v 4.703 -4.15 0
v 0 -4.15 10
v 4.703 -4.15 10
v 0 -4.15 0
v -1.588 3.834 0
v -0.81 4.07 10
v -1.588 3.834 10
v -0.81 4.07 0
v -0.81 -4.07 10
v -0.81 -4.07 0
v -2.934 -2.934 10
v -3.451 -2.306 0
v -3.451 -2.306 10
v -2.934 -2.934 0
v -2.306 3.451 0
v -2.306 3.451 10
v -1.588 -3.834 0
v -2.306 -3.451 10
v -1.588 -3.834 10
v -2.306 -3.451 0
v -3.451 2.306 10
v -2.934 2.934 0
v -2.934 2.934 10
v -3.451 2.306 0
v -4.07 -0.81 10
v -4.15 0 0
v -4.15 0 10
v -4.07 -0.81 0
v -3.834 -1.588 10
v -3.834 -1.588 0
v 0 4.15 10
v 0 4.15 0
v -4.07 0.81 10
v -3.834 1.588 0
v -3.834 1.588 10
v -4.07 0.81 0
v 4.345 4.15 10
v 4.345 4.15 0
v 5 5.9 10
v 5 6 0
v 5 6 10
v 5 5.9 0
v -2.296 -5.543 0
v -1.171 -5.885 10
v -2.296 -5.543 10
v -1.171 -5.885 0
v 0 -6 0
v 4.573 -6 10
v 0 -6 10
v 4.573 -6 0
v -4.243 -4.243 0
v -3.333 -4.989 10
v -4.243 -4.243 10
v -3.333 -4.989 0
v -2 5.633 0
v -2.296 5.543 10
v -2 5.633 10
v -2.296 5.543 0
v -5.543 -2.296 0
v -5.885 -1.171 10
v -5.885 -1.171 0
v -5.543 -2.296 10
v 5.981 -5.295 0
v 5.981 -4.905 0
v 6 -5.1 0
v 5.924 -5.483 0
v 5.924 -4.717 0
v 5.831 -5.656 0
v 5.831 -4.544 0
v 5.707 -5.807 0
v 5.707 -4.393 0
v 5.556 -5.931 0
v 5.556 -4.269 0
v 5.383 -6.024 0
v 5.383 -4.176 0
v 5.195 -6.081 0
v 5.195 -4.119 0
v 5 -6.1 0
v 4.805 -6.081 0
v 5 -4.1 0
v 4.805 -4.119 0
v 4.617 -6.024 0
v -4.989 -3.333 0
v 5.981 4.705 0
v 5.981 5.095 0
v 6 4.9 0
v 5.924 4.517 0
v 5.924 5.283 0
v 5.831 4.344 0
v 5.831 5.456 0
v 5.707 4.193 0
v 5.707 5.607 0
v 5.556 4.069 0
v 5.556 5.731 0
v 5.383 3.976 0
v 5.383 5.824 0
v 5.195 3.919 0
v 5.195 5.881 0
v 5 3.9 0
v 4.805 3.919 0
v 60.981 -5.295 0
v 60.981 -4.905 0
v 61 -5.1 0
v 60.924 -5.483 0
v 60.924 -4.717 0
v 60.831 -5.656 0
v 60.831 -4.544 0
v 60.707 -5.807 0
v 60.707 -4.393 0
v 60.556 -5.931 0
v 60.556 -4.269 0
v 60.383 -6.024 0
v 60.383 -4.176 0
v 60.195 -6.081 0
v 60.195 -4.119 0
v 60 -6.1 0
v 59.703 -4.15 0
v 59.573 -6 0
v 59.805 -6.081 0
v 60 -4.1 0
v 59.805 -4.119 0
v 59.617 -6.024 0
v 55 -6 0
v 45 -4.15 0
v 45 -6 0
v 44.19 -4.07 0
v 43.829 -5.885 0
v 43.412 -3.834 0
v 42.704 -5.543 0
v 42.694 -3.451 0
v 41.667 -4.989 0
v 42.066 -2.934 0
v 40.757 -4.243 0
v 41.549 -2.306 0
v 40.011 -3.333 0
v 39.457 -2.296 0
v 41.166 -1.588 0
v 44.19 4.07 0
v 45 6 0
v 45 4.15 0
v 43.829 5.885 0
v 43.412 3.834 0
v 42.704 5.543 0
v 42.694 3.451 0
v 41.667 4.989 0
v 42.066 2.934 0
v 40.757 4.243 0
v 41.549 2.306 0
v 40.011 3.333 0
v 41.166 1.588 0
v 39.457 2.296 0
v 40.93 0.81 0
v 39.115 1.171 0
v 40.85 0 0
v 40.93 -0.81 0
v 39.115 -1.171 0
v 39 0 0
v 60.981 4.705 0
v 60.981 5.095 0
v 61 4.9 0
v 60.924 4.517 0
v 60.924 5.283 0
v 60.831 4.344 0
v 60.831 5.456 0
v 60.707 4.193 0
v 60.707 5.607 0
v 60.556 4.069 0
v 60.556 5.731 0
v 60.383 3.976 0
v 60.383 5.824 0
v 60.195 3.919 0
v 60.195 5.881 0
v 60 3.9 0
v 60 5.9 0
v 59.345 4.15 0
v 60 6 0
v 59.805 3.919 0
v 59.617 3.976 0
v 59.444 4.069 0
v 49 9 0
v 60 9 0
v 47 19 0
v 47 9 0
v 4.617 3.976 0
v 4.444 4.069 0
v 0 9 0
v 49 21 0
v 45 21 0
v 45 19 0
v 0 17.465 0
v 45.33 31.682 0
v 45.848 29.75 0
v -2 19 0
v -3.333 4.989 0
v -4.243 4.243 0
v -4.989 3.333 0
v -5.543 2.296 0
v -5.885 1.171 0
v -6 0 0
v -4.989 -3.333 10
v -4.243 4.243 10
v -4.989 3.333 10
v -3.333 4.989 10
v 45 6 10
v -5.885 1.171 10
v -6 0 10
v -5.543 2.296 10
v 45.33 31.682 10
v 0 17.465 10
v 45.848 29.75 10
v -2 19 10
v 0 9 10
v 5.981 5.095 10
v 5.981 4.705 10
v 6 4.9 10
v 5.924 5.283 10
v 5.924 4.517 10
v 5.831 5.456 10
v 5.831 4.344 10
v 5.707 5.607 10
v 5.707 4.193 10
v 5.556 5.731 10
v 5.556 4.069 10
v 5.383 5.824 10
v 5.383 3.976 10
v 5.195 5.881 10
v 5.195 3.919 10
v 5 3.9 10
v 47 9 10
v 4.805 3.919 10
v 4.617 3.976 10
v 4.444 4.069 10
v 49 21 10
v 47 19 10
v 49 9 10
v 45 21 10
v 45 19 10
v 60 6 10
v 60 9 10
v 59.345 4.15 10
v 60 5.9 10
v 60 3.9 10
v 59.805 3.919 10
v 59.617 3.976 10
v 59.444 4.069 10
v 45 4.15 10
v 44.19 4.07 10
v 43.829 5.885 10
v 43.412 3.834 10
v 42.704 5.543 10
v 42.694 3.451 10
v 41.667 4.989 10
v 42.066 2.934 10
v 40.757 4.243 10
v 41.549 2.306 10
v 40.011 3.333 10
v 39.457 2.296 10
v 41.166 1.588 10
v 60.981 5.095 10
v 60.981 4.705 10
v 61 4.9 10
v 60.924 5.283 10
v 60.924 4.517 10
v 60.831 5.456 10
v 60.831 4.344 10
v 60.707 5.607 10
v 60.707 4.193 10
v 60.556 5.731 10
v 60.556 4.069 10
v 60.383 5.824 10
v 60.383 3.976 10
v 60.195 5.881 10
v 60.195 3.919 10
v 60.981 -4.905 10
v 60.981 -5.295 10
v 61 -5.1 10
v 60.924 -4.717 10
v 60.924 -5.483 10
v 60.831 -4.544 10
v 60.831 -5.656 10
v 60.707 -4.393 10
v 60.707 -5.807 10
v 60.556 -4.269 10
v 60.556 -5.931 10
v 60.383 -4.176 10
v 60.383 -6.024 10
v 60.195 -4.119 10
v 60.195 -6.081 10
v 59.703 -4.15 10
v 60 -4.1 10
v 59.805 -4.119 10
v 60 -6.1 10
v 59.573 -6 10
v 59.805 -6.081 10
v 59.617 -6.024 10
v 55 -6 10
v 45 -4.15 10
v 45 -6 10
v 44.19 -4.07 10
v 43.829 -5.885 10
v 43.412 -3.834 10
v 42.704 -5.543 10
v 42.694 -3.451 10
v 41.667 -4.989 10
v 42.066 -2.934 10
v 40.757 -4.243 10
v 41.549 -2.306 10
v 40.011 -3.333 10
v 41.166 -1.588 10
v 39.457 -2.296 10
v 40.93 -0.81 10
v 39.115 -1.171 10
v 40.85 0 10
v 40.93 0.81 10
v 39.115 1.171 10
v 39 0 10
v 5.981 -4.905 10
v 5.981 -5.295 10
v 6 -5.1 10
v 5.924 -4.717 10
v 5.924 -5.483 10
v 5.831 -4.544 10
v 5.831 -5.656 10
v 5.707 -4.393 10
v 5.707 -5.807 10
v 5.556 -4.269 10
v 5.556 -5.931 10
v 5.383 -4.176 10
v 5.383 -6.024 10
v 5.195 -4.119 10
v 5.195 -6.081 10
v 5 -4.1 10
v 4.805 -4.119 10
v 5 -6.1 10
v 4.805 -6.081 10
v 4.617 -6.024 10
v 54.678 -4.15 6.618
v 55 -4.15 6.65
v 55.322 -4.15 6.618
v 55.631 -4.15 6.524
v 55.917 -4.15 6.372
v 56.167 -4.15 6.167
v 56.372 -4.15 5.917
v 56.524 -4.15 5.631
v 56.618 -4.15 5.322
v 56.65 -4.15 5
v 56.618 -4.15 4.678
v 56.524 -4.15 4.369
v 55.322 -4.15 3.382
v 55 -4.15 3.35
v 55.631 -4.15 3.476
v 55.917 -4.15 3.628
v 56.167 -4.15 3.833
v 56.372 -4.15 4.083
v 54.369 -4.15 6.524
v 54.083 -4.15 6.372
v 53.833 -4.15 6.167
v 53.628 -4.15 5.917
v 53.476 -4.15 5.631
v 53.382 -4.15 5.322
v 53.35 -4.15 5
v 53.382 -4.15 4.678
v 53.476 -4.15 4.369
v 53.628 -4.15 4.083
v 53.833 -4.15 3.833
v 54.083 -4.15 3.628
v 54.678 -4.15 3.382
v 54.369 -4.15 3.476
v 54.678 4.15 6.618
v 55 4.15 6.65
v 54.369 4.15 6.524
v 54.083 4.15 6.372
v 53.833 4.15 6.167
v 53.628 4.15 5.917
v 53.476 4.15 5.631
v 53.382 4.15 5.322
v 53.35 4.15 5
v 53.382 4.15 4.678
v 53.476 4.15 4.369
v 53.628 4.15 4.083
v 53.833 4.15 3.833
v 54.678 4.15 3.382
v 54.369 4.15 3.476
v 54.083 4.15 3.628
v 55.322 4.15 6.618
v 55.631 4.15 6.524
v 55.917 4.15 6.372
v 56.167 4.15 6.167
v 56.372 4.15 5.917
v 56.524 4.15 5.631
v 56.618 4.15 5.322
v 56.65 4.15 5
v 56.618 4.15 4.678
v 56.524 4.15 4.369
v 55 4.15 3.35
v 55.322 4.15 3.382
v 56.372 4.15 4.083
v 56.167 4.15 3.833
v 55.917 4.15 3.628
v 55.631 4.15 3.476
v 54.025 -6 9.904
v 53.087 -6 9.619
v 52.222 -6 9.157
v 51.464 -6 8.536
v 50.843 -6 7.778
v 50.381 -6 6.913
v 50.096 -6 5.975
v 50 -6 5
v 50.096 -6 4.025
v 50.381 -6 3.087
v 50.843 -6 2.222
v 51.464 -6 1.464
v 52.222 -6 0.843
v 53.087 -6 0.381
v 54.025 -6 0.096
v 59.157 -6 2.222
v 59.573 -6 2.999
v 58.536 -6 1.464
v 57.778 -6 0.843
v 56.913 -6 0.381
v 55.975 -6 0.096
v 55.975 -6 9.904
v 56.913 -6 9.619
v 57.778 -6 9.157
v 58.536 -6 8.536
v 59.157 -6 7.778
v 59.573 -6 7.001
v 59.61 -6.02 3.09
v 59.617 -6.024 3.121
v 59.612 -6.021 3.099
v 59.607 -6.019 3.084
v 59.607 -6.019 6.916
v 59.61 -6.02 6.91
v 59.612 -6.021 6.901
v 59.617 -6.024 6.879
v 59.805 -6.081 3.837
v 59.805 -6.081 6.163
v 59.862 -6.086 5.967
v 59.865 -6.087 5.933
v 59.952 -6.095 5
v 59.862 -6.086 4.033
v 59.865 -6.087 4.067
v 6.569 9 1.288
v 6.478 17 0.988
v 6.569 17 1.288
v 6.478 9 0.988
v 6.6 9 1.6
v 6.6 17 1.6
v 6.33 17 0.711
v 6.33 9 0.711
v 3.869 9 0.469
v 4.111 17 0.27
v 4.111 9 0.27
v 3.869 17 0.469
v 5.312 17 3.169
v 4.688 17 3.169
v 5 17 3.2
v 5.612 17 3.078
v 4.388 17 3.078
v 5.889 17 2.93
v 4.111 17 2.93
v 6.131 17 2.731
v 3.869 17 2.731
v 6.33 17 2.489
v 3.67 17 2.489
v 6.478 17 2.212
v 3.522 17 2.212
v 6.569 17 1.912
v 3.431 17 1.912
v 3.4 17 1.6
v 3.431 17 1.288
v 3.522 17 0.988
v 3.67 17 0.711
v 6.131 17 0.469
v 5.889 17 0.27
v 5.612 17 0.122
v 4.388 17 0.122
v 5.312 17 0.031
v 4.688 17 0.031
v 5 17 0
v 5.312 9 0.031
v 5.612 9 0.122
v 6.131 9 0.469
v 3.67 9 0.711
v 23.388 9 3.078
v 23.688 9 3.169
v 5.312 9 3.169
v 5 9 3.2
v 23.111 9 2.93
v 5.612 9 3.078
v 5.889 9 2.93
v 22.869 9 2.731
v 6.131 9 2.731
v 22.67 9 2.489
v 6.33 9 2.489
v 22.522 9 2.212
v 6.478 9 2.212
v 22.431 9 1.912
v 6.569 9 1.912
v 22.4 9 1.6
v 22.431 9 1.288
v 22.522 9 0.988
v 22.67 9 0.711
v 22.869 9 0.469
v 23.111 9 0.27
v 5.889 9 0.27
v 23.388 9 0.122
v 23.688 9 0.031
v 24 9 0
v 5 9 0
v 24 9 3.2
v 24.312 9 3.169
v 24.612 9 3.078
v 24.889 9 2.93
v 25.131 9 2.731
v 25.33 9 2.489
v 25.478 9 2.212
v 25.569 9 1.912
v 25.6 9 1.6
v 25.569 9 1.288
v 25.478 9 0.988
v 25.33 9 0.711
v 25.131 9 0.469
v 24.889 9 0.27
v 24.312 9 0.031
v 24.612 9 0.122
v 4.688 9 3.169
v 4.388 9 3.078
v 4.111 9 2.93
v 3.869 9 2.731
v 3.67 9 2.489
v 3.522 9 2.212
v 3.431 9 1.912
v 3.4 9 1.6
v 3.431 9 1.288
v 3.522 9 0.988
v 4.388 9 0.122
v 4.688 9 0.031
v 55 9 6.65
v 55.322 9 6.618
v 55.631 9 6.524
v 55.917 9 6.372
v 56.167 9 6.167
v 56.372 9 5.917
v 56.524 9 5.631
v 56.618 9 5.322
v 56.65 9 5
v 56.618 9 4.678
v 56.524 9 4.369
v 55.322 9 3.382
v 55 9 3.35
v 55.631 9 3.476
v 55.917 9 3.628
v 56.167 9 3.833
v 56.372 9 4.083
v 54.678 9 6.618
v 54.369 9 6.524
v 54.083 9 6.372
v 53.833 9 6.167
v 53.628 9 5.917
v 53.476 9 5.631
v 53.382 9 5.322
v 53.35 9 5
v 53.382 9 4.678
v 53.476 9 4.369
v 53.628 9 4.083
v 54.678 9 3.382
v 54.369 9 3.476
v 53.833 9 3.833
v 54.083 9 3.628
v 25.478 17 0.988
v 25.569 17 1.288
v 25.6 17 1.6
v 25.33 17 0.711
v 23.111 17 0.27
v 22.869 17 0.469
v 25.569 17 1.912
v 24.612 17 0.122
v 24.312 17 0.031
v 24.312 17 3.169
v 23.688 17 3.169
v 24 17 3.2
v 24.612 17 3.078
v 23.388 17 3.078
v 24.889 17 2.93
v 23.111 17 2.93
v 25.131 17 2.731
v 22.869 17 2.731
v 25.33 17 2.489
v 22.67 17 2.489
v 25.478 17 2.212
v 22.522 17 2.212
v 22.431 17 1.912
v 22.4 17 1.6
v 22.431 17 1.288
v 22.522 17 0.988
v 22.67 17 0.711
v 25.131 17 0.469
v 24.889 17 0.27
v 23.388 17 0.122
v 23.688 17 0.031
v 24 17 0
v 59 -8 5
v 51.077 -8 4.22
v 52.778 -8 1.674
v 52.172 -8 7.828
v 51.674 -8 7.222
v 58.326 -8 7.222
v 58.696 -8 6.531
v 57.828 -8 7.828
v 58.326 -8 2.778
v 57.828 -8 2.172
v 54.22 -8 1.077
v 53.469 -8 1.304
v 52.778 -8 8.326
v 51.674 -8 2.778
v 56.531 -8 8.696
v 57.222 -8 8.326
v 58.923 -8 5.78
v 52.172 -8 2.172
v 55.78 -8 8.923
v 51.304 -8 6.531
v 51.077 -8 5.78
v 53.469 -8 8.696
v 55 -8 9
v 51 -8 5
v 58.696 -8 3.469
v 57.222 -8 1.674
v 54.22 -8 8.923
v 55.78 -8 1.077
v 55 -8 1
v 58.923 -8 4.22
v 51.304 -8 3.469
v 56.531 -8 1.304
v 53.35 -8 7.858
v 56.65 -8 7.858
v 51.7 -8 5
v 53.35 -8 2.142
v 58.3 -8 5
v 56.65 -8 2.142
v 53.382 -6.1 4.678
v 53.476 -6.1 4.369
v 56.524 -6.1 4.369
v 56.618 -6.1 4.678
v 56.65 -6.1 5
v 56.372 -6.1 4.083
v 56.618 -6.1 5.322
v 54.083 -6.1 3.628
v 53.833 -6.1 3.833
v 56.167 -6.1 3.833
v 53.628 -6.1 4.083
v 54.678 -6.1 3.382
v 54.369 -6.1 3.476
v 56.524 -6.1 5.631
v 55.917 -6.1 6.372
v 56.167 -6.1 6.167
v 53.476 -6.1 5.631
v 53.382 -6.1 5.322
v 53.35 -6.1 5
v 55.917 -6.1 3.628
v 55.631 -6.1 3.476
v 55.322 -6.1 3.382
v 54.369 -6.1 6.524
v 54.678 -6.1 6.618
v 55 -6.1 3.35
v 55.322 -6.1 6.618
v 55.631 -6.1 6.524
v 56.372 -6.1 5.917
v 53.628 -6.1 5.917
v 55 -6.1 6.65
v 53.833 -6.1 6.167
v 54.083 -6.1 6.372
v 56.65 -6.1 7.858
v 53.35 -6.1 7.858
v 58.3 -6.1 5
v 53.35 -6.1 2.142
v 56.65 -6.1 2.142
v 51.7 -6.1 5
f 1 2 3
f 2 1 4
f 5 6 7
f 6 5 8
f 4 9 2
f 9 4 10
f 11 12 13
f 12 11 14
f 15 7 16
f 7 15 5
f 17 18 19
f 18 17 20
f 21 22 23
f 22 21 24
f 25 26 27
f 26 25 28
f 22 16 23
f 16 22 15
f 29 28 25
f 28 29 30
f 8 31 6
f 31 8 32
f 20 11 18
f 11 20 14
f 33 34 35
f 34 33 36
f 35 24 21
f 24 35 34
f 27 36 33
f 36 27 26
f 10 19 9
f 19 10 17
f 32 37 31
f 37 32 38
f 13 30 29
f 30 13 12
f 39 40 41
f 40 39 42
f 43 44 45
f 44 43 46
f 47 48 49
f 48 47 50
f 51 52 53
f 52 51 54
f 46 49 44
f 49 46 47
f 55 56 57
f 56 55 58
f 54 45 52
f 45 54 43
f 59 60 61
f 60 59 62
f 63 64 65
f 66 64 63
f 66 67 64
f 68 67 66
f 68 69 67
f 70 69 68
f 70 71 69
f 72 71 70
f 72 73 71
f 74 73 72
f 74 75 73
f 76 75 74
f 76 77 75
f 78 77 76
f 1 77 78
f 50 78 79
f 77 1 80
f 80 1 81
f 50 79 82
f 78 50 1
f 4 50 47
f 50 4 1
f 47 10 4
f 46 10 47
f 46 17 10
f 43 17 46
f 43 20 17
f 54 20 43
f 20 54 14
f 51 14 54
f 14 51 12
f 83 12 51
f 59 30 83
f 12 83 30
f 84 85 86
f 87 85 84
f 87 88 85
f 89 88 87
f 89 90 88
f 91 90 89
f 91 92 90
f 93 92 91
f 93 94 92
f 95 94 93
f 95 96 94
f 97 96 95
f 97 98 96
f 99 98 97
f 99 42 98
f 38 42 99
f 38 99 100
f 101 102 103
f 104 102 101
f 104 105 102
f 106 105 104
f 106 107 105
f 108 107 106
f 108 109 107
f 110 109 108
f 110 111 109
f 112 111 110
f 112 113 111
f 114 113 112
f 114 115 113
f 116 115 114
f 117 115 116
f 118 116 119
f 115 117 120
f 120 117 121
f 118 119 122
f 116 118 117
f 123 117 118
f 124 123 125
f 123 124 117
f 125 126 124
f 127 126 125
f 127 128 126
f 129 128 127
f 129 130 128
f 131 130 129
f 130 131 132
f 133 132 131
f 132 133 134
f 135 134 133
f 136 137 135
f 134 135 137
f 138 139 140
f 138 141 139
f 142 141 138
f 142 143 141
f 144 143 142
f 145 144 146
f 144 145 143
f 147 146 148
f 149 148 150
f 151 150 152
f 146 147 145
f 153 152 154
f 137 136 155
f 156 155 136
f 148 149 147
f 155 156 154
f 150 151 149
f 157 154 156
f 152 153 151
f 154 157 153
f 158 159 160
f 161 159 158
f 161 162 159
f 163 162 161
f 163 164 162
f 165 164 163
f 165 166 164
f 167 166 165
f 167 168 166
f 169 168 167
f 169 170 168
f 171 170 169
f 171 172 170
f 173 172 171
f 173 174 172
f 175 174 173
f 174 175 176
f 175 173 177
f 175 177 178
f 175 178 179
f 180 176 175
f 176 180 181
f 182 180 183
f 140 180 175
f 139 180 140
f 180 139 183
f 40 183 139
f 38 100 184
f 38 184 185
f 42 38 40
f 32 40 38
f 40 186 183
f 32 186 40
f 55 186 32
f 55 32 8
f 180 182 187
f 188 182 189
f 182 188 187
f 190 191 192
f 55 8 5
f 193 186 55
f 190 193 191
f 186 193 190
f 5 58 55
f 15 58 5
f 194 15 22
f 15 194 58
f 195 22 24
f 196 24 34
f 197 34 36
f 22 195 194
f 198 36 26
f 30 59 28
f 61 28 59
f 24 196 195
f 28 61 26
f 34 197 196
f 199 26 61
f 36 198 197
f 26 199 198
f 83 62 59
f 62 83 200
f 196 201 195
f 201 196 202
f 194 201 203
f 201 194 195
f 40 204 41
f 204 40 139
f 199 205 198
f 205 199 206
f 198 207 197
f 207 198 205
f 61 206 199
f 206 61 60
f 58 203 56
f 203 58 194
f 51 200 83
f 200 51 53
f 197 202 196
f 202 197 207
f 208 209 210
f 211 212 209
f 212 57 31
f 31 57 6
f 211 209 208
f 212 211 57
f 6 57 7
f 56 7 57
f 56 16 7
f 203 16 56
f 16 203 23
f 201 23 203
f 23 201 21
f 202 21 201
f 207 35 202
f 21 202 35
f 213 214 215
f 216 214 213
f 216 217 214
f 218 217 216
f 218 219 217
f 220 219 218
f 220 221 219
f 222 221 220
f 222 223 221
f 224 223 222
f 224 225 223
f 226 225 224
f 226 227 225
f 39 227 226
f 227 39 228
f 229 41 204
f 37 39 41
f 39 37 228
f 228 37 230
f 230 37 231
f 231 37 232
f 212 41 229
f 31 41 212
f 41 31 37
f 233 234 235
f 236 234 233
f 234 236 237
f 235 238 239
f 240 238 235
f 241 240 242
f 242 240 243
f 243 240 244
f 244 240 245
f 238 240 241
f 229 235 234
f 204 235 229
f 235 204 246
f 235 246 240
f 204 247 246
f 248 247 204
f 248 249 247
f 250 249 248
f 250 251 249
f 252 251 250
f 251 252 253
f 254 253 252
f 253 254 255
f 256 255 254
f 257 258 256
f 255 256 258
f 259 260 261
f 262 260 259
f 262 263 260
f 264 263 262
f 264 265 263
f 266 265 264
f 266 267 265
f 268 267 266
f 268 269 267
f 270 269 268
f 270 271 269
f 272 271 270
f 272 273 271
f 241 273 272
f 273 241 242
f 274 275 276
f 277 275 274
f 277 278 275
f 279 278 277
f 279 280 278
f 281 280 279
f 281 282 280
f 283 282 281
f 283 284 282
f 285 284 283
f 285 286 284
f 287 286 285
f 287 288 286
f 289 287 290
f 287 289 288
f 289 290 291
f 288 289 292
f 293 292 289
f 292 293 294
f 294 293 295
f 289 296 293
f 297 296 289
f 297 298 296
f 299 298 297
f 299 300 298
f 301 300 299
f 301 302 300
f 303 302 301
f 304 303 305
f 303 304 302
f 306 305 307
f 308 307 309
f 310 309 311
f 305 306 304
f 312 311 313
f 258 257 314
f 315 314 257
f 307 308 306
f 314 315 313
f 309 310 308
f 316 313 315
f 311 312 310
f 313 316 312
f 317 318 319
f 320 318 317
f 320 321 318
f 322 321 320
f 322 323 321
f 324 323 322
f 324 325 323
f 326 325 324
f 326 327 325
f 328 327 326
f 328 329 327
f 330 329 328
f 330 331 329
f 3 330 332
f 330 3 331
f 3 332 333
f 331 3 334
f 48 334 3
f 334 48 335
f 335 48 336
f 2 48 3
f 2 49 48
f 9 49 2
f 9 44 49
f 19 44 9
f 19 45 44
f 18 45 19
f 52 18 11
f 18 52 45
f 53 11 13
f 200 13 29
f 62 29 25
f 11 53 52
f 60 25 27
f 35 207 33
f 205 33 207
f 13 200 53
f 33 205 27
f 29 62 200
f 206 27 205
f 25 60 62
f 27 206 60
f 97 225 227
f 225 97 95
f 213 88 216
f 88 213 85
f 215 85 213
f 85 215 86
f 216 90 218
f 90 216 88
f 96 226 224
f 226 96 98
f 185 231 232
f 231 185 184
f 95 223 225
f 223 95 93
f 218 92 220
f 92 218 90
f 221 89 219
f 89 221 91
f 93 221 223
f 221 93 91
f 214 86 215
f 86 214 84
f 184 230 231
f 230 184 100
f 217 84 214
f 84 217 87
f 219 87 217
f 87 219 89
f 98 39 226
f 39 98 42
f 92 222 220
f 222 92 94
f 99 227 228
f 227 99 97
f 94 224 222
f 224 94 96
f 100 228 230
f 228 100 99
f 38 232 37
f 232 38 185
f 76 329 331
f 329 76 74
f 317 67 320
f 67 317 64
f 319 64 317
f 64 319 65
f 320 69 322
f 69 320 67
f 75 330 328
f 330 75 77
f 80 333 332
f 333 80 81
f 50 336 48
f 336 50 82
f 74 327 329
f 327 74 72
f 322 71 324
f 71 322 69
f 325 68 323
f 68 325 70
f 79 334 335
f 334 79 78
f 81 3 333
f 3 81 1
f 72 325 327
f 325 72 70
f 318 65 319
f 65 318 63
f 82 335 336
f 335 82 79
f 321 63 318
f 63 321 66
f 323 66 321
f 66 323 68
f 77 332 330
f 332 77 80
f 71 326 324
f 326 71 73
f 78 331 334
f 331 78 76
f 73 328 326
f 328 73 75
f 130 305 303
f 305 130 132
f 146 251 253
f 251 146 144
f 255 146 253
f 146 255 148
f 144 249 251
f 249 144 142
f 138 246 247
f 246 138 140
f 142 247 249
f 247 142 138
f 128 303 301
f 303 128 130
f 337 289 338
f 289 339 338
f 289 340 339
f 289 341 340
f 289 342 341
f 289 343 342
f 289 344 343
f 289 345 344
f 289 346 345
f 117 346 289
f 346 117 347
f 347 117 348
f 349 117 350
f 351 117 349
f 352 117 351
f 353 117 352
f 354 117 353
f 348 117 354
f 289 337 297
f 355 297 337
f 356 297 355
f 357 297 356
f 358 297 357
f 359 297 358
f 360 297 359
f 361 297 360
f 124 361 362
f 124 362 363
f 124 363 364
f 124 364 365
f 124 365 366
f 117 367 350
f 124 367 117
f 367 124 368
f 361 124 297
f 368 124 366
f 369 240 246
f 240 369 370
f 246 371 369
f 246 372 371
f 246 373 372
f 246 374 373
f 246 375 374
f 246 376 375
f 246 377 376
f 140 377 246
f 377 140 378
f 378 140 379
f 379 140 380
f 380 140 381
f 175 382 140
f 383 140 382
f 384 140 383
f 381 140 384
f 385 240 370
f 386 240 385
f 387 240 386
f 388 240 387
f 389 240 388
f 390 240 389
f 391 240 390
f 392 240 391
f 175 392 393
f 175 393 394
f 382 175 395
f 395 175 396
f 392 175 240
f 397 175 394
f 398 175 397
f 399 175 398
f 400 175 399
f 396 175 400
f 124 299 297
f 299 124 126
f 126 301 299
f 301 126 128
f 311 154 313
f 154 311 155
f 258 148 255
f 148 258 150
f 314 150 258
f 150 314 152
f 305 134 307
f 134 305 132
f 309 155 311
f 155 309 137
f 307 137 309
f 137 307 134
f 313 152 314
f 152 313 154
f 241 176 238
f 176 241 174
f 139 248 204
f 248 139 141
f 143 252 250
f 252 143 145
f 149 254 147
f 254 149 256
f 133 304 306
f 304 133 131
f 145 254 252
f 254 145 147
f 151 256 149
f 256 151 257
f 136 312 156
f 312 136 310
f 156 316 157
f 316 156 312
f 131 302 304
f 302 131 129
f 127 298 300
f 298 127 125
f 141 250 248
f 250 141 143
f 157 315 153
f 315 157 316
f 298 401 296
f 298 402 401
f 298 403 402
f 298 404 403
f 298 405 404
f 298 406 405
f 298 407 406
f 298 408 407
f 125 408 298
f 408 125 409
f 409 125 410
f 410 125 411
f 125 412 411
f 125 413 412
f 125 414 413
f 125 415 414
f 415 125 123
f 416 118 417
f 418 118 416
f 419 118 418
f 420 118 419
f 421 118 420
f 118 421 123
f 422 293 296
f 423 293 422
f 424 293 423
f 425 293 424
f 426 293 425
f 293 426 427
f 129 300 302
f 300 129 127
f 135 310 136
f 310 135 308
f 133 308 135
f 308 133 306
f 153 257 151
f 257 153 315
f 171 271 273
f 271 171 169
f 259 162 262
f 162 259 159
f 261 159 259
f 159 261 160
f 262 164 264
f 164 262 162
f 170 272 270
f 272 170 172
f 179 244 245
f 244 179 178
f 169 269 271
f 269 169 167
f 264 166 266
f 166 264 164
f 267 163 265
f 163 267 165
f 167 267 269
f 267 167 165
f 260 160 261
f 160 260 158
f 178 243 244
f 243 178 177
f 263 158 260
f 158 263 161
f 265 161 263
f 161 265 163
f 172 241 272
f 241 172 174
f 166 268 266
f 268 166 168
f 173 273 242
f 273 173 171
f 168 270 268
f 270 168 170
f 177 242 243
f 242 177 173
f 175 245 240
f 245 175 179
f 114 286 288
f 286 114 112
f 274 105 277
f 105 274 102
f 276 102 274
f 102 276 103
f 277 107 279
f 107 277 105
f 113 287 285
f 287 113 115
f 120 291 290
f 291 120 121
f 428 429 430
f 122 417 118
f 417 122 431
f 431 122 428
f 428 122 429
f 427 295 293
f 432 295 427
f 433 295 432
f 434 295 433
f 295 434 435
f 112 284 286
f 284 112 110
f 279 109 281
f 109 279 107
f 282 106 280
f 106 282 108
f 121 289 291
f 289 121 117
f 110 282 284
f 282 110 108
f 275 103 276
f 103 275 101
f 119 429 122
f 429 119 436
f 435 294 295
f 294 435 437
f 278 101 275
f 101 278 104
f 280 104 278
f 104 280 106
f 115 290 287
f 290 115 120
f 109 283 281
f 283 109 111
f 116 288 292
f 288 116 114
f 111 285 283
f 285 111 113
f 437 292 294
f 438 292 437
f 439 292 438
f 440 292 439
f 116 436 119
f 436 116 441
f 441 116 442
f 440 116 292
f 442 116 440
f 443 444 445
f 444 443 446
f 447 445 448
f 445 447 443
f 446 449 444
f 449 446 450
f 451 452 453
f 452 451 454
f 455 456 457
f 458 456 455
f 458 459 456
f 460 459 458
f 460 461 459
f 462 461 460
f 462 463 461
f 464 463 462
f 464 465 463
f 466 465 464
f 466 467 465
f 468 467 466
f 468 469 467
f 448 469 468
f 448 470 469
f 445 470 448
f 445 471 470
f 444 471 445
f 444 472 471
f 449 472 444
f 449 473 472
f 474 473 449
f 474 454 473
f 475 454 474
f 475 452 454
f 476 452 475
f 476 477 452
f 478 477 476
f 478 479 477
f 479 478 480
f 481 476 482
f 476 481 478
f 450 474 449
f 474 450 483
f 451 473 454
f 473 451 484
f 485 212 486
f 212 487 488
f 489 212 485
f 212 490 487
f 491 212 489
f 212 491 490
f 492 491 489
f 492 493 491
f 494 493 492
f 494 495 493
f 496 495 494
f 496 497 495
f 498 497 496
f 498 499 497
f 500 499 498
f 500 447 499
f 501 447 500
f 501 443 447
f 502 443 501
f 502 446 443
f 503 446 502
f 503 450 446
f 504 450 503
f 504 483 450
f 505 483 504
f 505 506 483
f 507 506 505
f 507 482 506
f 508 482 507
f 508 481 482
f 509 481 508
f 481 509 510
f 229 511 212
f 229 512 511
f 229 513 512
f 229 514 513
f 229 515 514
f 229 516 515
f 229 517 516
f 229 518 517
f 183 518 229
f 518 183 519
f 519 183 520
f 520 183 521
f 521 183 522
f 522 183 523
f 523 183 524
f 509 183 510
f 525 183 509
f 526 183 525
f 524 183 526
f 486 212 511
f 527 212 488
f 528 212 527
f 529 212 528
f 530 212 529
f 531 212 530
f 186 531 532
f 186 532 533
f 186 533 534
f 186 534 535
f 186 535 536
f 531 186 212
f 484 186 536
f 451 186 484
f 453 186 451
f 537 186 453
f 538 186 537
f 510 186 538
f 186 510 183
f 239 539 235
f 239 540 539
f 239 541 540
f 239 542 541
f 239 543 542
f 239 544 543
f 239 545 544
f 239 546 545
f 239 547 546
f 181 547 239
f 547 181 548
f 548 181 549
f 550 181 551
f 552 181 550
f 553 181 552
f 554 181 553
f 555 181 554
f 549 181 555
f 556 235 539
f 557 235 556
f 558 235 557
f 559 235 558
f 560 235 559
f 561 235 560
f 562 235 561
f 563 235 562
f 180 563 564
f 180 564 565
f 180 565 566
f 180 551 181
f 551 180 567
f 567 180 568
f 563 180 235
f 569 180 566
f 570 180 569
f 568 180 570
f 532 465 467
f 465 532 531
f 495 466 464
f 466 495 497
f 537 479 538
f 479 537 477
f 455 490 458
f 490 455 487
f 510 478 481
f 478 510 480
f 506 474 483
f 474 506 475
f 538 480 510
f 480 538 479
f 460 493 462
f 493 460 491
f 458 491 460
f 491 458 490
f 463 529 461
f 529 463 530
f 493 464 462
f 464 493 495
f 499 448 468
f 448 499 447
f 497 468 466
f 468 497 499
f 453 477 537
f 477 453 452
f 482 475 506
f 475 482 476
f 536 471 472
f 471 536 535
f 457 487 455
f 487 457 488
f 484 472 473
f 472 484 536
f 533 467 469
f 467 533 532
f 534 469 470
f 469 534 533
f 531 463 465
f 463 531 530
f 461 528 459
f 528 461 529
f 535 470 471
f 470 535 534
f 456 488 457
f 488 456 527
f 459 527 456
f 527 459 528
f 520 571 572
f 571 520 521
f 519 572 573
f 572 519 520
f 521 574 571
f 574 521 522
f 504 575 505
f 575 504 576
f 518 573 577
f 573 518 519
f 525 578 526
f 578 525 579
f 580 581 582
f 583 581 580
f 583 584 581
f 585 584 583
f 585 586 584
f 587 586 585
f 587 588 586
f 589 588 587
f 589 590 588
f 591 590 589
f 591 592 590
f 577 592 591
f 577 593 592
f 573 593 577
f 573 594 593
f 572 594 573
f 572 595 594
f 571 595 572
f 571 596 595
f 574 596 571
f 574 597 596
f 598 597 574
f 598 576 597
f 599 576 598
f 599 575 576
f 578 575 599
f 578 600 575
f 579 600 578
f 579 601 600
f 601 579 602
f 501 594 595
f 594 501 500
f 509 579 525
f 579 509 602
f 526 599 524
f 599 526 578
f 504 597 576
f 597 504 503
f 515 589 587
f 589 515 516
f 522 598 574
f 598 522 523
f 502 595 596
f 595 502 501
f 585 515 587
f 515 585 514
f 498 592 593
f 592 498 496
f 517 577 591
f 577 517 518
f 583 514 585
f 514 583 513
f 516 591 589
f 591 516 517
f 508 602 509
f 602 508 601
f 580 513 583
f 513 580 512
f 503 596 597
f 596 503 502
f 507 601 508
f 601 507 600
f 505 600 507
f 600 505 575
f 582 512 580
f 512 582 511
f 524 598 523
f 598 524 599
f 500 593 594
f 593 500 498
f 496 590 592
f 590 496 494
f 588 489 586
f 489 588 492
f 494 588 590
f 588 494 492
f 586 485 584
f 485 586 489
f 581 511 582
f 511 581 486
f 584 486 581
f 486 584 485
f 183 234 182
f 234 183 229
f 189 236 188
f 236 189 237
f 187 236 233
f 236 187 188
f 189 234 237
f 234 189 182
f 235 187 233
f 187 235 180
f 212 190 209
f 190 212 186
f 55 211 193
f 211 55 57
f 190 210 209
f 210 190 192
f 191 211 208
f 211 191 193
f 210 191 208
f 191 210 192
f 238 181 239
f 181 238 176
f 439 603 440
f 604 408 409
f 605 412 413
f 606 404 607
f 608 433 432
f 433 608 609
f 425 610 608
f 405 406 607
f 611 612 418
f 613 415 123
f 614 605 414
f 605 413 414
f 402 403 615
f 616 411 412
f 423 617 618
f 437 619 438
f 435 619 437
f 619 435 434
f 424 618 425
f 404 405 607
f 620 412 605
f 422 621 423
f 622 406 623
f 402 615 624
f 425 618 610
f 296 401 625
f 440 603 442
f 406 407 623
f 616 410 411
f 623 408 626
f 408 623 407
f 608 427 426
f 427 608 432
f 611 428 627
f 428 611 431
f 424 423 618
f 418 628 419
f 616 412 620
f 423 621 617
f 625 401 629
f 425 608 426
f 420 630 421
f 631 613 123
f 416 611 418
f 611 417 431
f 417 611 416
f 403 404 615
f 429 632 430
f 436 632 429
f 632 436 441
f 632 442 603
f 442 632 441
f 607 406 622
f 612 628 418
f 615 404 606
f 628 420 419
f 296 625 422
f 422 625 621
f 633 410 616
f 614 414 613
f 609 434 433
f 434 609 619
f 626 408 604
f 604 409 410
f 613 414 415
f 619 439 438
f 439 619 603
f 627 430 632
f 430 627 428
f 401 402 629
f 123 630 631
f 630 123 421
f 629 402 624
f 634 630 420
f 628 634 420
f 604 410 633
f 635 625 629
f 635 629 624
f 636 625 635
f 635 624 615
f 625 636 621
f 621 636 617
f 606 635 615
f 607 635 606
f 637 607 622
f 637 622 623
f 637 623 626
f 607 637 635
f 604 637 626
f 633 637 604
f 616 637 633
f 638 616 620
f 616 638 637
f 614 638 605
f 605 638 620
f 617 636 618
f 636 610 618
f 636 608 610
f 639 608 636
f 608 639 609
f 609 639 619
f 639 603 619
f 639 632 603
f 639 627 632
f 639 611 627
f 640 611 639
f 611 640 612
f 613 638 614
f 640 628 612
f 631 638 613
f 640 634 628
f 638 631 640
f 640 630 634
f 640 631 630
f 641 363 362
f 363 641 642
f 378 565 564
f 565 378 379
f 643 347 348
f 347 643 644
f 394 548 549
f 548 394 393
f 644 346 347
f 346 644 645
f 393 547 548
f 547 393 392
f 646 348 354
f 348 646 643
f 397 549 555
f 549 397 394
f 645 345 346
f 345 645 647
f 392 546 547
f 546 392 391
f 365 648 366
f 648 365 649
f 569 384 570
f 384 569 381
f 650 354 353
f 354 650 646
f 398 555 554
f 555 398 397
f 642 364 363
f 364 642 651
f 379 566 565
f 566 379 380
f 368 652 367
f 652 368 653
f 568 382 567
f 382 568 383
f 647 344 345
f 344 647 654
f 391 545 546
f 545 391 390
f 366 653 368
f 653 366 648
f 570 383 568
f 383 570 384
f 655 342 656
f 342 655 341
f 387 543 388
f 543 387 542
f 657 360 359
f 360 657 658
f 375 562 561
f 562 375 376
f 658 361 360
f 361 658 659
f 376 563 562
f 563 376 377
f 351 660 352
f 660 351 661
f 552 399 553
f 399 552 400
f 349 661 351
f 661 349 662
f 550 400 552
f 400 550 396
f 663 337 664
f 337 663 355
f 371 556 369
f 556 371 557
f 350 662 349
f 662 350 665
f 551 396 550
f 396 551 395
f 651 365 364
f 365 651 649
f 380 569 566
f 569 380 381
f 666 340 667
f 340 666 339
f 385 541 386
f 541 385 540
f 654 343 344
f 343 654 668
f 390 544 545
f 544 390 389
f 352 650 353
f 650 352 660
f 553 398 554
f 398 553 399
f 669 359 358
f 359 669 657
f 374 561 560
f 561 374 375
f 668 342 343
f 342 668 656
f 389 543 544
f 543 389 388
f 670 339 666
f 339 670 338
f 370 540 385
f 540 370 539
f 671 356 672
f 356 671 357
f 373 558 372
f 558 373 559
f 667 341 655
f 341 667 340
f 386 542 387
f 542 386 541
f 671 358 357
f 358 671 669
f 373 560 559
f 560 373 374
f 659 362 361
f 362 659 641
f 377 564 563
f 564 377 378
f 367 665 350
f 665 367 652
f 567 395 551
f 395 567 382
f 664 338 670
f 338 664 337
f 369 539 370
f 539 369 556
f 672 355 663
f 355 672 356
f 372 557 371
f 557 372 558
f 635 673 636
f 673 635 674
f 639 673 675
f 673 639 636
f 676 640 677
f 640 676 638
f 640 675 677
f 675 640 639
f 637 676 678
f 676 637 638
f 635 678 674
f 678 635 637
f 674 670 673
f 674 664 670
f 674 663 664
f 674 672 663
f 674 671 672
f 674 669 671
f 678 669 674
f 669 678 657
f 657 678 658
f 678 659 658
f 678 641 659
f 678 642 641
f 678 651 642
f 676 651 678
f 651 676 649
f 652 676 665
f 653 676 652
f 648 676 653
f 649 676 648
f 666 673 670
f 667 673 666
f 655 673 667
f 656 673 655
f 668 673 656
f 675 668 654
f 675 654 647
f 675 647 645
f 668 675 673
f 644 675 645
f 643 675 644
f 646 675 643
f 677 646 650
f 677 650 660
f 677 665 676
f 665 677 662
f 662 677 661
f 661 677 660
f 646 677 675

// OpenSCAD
//detector holes distance
holes_dist=19;
//detector holes diameter
holes_d=3.2;
//with clip
with_clip=1; //[0:No,1:Yes]
//
holes_shift=5;

//distance between rods
rod_dist=45;
//rod diameter
rod_d=8;
//common height
height=10;
//nozzle size (for hole corrections)
nozzle=.3;

/*[hidden]*/
$fn=32;

difference(){
  union(){
    translate([0,0,0])hook(5,rod_d+4,rod_d,height);
    translate([rod_dist,0,0])hook(rod_d+7,rod_d+4,rod_d,height);
    translate([0,rod_d/2+2,0]){
       cube([rod_d+7+rod_dist,3,height]);
      translate([holes_shift,3,holes_d/2])rotate([-90,0,0]){
        cylinder(d=holes_d,h=8);
        translate([holes_dist,0,0])cylinder(d=holes_d,h=8);
      }
      if (with_clip){
        translate([-2,-1,0])cube([2,4+8+2,10]);
        translate([-2,13,0])rotate([0,0,-75])cube([2,50-1,10]);
        translate([42+5,3,0]){
          translate([-2,10,0])cube([2,2,10]);
          cube([2,12,10]);
        }
      }
    }
    translate([rod_d+2+rod_dist,-rod_d/2-2,height/2])rotate([90,0,0])
      cylinder(d1=10,d2=8,h=2);
  }
  translate([rod_d+2+rod_dist,-rod_d/2-2-2.1,height/2])rotate([-90,0,0]){
    cylinder(d=3+nozzle,h=rod_d+10);
    cylinder(d=6+2*nozzle,h=2,$fn=6);
  }
}

module hook(l=5,od=12,id=8,h=10){
difference(){
  hull(){
    cylinder(d=od,h=h);
    translate([l,0,0])cylinder(d=od,h=h);
  }
  translate([0,0,-.1]){
    hull(){
      cylinder(d=id+nozzle,h=h+.2);
      translate([l,0,0])cylinder(d=id+nozzle,h=h+.2);
    }
  translate([l,-od/2-.1,0])cube([od,od+.2,h+.2]);
  }
  }
  for (i=[1,-1])
  translate([l,i*(id/2+(od-id)/4)-.1,0])cylinder(d=(od-id)/2,h=h);
}
